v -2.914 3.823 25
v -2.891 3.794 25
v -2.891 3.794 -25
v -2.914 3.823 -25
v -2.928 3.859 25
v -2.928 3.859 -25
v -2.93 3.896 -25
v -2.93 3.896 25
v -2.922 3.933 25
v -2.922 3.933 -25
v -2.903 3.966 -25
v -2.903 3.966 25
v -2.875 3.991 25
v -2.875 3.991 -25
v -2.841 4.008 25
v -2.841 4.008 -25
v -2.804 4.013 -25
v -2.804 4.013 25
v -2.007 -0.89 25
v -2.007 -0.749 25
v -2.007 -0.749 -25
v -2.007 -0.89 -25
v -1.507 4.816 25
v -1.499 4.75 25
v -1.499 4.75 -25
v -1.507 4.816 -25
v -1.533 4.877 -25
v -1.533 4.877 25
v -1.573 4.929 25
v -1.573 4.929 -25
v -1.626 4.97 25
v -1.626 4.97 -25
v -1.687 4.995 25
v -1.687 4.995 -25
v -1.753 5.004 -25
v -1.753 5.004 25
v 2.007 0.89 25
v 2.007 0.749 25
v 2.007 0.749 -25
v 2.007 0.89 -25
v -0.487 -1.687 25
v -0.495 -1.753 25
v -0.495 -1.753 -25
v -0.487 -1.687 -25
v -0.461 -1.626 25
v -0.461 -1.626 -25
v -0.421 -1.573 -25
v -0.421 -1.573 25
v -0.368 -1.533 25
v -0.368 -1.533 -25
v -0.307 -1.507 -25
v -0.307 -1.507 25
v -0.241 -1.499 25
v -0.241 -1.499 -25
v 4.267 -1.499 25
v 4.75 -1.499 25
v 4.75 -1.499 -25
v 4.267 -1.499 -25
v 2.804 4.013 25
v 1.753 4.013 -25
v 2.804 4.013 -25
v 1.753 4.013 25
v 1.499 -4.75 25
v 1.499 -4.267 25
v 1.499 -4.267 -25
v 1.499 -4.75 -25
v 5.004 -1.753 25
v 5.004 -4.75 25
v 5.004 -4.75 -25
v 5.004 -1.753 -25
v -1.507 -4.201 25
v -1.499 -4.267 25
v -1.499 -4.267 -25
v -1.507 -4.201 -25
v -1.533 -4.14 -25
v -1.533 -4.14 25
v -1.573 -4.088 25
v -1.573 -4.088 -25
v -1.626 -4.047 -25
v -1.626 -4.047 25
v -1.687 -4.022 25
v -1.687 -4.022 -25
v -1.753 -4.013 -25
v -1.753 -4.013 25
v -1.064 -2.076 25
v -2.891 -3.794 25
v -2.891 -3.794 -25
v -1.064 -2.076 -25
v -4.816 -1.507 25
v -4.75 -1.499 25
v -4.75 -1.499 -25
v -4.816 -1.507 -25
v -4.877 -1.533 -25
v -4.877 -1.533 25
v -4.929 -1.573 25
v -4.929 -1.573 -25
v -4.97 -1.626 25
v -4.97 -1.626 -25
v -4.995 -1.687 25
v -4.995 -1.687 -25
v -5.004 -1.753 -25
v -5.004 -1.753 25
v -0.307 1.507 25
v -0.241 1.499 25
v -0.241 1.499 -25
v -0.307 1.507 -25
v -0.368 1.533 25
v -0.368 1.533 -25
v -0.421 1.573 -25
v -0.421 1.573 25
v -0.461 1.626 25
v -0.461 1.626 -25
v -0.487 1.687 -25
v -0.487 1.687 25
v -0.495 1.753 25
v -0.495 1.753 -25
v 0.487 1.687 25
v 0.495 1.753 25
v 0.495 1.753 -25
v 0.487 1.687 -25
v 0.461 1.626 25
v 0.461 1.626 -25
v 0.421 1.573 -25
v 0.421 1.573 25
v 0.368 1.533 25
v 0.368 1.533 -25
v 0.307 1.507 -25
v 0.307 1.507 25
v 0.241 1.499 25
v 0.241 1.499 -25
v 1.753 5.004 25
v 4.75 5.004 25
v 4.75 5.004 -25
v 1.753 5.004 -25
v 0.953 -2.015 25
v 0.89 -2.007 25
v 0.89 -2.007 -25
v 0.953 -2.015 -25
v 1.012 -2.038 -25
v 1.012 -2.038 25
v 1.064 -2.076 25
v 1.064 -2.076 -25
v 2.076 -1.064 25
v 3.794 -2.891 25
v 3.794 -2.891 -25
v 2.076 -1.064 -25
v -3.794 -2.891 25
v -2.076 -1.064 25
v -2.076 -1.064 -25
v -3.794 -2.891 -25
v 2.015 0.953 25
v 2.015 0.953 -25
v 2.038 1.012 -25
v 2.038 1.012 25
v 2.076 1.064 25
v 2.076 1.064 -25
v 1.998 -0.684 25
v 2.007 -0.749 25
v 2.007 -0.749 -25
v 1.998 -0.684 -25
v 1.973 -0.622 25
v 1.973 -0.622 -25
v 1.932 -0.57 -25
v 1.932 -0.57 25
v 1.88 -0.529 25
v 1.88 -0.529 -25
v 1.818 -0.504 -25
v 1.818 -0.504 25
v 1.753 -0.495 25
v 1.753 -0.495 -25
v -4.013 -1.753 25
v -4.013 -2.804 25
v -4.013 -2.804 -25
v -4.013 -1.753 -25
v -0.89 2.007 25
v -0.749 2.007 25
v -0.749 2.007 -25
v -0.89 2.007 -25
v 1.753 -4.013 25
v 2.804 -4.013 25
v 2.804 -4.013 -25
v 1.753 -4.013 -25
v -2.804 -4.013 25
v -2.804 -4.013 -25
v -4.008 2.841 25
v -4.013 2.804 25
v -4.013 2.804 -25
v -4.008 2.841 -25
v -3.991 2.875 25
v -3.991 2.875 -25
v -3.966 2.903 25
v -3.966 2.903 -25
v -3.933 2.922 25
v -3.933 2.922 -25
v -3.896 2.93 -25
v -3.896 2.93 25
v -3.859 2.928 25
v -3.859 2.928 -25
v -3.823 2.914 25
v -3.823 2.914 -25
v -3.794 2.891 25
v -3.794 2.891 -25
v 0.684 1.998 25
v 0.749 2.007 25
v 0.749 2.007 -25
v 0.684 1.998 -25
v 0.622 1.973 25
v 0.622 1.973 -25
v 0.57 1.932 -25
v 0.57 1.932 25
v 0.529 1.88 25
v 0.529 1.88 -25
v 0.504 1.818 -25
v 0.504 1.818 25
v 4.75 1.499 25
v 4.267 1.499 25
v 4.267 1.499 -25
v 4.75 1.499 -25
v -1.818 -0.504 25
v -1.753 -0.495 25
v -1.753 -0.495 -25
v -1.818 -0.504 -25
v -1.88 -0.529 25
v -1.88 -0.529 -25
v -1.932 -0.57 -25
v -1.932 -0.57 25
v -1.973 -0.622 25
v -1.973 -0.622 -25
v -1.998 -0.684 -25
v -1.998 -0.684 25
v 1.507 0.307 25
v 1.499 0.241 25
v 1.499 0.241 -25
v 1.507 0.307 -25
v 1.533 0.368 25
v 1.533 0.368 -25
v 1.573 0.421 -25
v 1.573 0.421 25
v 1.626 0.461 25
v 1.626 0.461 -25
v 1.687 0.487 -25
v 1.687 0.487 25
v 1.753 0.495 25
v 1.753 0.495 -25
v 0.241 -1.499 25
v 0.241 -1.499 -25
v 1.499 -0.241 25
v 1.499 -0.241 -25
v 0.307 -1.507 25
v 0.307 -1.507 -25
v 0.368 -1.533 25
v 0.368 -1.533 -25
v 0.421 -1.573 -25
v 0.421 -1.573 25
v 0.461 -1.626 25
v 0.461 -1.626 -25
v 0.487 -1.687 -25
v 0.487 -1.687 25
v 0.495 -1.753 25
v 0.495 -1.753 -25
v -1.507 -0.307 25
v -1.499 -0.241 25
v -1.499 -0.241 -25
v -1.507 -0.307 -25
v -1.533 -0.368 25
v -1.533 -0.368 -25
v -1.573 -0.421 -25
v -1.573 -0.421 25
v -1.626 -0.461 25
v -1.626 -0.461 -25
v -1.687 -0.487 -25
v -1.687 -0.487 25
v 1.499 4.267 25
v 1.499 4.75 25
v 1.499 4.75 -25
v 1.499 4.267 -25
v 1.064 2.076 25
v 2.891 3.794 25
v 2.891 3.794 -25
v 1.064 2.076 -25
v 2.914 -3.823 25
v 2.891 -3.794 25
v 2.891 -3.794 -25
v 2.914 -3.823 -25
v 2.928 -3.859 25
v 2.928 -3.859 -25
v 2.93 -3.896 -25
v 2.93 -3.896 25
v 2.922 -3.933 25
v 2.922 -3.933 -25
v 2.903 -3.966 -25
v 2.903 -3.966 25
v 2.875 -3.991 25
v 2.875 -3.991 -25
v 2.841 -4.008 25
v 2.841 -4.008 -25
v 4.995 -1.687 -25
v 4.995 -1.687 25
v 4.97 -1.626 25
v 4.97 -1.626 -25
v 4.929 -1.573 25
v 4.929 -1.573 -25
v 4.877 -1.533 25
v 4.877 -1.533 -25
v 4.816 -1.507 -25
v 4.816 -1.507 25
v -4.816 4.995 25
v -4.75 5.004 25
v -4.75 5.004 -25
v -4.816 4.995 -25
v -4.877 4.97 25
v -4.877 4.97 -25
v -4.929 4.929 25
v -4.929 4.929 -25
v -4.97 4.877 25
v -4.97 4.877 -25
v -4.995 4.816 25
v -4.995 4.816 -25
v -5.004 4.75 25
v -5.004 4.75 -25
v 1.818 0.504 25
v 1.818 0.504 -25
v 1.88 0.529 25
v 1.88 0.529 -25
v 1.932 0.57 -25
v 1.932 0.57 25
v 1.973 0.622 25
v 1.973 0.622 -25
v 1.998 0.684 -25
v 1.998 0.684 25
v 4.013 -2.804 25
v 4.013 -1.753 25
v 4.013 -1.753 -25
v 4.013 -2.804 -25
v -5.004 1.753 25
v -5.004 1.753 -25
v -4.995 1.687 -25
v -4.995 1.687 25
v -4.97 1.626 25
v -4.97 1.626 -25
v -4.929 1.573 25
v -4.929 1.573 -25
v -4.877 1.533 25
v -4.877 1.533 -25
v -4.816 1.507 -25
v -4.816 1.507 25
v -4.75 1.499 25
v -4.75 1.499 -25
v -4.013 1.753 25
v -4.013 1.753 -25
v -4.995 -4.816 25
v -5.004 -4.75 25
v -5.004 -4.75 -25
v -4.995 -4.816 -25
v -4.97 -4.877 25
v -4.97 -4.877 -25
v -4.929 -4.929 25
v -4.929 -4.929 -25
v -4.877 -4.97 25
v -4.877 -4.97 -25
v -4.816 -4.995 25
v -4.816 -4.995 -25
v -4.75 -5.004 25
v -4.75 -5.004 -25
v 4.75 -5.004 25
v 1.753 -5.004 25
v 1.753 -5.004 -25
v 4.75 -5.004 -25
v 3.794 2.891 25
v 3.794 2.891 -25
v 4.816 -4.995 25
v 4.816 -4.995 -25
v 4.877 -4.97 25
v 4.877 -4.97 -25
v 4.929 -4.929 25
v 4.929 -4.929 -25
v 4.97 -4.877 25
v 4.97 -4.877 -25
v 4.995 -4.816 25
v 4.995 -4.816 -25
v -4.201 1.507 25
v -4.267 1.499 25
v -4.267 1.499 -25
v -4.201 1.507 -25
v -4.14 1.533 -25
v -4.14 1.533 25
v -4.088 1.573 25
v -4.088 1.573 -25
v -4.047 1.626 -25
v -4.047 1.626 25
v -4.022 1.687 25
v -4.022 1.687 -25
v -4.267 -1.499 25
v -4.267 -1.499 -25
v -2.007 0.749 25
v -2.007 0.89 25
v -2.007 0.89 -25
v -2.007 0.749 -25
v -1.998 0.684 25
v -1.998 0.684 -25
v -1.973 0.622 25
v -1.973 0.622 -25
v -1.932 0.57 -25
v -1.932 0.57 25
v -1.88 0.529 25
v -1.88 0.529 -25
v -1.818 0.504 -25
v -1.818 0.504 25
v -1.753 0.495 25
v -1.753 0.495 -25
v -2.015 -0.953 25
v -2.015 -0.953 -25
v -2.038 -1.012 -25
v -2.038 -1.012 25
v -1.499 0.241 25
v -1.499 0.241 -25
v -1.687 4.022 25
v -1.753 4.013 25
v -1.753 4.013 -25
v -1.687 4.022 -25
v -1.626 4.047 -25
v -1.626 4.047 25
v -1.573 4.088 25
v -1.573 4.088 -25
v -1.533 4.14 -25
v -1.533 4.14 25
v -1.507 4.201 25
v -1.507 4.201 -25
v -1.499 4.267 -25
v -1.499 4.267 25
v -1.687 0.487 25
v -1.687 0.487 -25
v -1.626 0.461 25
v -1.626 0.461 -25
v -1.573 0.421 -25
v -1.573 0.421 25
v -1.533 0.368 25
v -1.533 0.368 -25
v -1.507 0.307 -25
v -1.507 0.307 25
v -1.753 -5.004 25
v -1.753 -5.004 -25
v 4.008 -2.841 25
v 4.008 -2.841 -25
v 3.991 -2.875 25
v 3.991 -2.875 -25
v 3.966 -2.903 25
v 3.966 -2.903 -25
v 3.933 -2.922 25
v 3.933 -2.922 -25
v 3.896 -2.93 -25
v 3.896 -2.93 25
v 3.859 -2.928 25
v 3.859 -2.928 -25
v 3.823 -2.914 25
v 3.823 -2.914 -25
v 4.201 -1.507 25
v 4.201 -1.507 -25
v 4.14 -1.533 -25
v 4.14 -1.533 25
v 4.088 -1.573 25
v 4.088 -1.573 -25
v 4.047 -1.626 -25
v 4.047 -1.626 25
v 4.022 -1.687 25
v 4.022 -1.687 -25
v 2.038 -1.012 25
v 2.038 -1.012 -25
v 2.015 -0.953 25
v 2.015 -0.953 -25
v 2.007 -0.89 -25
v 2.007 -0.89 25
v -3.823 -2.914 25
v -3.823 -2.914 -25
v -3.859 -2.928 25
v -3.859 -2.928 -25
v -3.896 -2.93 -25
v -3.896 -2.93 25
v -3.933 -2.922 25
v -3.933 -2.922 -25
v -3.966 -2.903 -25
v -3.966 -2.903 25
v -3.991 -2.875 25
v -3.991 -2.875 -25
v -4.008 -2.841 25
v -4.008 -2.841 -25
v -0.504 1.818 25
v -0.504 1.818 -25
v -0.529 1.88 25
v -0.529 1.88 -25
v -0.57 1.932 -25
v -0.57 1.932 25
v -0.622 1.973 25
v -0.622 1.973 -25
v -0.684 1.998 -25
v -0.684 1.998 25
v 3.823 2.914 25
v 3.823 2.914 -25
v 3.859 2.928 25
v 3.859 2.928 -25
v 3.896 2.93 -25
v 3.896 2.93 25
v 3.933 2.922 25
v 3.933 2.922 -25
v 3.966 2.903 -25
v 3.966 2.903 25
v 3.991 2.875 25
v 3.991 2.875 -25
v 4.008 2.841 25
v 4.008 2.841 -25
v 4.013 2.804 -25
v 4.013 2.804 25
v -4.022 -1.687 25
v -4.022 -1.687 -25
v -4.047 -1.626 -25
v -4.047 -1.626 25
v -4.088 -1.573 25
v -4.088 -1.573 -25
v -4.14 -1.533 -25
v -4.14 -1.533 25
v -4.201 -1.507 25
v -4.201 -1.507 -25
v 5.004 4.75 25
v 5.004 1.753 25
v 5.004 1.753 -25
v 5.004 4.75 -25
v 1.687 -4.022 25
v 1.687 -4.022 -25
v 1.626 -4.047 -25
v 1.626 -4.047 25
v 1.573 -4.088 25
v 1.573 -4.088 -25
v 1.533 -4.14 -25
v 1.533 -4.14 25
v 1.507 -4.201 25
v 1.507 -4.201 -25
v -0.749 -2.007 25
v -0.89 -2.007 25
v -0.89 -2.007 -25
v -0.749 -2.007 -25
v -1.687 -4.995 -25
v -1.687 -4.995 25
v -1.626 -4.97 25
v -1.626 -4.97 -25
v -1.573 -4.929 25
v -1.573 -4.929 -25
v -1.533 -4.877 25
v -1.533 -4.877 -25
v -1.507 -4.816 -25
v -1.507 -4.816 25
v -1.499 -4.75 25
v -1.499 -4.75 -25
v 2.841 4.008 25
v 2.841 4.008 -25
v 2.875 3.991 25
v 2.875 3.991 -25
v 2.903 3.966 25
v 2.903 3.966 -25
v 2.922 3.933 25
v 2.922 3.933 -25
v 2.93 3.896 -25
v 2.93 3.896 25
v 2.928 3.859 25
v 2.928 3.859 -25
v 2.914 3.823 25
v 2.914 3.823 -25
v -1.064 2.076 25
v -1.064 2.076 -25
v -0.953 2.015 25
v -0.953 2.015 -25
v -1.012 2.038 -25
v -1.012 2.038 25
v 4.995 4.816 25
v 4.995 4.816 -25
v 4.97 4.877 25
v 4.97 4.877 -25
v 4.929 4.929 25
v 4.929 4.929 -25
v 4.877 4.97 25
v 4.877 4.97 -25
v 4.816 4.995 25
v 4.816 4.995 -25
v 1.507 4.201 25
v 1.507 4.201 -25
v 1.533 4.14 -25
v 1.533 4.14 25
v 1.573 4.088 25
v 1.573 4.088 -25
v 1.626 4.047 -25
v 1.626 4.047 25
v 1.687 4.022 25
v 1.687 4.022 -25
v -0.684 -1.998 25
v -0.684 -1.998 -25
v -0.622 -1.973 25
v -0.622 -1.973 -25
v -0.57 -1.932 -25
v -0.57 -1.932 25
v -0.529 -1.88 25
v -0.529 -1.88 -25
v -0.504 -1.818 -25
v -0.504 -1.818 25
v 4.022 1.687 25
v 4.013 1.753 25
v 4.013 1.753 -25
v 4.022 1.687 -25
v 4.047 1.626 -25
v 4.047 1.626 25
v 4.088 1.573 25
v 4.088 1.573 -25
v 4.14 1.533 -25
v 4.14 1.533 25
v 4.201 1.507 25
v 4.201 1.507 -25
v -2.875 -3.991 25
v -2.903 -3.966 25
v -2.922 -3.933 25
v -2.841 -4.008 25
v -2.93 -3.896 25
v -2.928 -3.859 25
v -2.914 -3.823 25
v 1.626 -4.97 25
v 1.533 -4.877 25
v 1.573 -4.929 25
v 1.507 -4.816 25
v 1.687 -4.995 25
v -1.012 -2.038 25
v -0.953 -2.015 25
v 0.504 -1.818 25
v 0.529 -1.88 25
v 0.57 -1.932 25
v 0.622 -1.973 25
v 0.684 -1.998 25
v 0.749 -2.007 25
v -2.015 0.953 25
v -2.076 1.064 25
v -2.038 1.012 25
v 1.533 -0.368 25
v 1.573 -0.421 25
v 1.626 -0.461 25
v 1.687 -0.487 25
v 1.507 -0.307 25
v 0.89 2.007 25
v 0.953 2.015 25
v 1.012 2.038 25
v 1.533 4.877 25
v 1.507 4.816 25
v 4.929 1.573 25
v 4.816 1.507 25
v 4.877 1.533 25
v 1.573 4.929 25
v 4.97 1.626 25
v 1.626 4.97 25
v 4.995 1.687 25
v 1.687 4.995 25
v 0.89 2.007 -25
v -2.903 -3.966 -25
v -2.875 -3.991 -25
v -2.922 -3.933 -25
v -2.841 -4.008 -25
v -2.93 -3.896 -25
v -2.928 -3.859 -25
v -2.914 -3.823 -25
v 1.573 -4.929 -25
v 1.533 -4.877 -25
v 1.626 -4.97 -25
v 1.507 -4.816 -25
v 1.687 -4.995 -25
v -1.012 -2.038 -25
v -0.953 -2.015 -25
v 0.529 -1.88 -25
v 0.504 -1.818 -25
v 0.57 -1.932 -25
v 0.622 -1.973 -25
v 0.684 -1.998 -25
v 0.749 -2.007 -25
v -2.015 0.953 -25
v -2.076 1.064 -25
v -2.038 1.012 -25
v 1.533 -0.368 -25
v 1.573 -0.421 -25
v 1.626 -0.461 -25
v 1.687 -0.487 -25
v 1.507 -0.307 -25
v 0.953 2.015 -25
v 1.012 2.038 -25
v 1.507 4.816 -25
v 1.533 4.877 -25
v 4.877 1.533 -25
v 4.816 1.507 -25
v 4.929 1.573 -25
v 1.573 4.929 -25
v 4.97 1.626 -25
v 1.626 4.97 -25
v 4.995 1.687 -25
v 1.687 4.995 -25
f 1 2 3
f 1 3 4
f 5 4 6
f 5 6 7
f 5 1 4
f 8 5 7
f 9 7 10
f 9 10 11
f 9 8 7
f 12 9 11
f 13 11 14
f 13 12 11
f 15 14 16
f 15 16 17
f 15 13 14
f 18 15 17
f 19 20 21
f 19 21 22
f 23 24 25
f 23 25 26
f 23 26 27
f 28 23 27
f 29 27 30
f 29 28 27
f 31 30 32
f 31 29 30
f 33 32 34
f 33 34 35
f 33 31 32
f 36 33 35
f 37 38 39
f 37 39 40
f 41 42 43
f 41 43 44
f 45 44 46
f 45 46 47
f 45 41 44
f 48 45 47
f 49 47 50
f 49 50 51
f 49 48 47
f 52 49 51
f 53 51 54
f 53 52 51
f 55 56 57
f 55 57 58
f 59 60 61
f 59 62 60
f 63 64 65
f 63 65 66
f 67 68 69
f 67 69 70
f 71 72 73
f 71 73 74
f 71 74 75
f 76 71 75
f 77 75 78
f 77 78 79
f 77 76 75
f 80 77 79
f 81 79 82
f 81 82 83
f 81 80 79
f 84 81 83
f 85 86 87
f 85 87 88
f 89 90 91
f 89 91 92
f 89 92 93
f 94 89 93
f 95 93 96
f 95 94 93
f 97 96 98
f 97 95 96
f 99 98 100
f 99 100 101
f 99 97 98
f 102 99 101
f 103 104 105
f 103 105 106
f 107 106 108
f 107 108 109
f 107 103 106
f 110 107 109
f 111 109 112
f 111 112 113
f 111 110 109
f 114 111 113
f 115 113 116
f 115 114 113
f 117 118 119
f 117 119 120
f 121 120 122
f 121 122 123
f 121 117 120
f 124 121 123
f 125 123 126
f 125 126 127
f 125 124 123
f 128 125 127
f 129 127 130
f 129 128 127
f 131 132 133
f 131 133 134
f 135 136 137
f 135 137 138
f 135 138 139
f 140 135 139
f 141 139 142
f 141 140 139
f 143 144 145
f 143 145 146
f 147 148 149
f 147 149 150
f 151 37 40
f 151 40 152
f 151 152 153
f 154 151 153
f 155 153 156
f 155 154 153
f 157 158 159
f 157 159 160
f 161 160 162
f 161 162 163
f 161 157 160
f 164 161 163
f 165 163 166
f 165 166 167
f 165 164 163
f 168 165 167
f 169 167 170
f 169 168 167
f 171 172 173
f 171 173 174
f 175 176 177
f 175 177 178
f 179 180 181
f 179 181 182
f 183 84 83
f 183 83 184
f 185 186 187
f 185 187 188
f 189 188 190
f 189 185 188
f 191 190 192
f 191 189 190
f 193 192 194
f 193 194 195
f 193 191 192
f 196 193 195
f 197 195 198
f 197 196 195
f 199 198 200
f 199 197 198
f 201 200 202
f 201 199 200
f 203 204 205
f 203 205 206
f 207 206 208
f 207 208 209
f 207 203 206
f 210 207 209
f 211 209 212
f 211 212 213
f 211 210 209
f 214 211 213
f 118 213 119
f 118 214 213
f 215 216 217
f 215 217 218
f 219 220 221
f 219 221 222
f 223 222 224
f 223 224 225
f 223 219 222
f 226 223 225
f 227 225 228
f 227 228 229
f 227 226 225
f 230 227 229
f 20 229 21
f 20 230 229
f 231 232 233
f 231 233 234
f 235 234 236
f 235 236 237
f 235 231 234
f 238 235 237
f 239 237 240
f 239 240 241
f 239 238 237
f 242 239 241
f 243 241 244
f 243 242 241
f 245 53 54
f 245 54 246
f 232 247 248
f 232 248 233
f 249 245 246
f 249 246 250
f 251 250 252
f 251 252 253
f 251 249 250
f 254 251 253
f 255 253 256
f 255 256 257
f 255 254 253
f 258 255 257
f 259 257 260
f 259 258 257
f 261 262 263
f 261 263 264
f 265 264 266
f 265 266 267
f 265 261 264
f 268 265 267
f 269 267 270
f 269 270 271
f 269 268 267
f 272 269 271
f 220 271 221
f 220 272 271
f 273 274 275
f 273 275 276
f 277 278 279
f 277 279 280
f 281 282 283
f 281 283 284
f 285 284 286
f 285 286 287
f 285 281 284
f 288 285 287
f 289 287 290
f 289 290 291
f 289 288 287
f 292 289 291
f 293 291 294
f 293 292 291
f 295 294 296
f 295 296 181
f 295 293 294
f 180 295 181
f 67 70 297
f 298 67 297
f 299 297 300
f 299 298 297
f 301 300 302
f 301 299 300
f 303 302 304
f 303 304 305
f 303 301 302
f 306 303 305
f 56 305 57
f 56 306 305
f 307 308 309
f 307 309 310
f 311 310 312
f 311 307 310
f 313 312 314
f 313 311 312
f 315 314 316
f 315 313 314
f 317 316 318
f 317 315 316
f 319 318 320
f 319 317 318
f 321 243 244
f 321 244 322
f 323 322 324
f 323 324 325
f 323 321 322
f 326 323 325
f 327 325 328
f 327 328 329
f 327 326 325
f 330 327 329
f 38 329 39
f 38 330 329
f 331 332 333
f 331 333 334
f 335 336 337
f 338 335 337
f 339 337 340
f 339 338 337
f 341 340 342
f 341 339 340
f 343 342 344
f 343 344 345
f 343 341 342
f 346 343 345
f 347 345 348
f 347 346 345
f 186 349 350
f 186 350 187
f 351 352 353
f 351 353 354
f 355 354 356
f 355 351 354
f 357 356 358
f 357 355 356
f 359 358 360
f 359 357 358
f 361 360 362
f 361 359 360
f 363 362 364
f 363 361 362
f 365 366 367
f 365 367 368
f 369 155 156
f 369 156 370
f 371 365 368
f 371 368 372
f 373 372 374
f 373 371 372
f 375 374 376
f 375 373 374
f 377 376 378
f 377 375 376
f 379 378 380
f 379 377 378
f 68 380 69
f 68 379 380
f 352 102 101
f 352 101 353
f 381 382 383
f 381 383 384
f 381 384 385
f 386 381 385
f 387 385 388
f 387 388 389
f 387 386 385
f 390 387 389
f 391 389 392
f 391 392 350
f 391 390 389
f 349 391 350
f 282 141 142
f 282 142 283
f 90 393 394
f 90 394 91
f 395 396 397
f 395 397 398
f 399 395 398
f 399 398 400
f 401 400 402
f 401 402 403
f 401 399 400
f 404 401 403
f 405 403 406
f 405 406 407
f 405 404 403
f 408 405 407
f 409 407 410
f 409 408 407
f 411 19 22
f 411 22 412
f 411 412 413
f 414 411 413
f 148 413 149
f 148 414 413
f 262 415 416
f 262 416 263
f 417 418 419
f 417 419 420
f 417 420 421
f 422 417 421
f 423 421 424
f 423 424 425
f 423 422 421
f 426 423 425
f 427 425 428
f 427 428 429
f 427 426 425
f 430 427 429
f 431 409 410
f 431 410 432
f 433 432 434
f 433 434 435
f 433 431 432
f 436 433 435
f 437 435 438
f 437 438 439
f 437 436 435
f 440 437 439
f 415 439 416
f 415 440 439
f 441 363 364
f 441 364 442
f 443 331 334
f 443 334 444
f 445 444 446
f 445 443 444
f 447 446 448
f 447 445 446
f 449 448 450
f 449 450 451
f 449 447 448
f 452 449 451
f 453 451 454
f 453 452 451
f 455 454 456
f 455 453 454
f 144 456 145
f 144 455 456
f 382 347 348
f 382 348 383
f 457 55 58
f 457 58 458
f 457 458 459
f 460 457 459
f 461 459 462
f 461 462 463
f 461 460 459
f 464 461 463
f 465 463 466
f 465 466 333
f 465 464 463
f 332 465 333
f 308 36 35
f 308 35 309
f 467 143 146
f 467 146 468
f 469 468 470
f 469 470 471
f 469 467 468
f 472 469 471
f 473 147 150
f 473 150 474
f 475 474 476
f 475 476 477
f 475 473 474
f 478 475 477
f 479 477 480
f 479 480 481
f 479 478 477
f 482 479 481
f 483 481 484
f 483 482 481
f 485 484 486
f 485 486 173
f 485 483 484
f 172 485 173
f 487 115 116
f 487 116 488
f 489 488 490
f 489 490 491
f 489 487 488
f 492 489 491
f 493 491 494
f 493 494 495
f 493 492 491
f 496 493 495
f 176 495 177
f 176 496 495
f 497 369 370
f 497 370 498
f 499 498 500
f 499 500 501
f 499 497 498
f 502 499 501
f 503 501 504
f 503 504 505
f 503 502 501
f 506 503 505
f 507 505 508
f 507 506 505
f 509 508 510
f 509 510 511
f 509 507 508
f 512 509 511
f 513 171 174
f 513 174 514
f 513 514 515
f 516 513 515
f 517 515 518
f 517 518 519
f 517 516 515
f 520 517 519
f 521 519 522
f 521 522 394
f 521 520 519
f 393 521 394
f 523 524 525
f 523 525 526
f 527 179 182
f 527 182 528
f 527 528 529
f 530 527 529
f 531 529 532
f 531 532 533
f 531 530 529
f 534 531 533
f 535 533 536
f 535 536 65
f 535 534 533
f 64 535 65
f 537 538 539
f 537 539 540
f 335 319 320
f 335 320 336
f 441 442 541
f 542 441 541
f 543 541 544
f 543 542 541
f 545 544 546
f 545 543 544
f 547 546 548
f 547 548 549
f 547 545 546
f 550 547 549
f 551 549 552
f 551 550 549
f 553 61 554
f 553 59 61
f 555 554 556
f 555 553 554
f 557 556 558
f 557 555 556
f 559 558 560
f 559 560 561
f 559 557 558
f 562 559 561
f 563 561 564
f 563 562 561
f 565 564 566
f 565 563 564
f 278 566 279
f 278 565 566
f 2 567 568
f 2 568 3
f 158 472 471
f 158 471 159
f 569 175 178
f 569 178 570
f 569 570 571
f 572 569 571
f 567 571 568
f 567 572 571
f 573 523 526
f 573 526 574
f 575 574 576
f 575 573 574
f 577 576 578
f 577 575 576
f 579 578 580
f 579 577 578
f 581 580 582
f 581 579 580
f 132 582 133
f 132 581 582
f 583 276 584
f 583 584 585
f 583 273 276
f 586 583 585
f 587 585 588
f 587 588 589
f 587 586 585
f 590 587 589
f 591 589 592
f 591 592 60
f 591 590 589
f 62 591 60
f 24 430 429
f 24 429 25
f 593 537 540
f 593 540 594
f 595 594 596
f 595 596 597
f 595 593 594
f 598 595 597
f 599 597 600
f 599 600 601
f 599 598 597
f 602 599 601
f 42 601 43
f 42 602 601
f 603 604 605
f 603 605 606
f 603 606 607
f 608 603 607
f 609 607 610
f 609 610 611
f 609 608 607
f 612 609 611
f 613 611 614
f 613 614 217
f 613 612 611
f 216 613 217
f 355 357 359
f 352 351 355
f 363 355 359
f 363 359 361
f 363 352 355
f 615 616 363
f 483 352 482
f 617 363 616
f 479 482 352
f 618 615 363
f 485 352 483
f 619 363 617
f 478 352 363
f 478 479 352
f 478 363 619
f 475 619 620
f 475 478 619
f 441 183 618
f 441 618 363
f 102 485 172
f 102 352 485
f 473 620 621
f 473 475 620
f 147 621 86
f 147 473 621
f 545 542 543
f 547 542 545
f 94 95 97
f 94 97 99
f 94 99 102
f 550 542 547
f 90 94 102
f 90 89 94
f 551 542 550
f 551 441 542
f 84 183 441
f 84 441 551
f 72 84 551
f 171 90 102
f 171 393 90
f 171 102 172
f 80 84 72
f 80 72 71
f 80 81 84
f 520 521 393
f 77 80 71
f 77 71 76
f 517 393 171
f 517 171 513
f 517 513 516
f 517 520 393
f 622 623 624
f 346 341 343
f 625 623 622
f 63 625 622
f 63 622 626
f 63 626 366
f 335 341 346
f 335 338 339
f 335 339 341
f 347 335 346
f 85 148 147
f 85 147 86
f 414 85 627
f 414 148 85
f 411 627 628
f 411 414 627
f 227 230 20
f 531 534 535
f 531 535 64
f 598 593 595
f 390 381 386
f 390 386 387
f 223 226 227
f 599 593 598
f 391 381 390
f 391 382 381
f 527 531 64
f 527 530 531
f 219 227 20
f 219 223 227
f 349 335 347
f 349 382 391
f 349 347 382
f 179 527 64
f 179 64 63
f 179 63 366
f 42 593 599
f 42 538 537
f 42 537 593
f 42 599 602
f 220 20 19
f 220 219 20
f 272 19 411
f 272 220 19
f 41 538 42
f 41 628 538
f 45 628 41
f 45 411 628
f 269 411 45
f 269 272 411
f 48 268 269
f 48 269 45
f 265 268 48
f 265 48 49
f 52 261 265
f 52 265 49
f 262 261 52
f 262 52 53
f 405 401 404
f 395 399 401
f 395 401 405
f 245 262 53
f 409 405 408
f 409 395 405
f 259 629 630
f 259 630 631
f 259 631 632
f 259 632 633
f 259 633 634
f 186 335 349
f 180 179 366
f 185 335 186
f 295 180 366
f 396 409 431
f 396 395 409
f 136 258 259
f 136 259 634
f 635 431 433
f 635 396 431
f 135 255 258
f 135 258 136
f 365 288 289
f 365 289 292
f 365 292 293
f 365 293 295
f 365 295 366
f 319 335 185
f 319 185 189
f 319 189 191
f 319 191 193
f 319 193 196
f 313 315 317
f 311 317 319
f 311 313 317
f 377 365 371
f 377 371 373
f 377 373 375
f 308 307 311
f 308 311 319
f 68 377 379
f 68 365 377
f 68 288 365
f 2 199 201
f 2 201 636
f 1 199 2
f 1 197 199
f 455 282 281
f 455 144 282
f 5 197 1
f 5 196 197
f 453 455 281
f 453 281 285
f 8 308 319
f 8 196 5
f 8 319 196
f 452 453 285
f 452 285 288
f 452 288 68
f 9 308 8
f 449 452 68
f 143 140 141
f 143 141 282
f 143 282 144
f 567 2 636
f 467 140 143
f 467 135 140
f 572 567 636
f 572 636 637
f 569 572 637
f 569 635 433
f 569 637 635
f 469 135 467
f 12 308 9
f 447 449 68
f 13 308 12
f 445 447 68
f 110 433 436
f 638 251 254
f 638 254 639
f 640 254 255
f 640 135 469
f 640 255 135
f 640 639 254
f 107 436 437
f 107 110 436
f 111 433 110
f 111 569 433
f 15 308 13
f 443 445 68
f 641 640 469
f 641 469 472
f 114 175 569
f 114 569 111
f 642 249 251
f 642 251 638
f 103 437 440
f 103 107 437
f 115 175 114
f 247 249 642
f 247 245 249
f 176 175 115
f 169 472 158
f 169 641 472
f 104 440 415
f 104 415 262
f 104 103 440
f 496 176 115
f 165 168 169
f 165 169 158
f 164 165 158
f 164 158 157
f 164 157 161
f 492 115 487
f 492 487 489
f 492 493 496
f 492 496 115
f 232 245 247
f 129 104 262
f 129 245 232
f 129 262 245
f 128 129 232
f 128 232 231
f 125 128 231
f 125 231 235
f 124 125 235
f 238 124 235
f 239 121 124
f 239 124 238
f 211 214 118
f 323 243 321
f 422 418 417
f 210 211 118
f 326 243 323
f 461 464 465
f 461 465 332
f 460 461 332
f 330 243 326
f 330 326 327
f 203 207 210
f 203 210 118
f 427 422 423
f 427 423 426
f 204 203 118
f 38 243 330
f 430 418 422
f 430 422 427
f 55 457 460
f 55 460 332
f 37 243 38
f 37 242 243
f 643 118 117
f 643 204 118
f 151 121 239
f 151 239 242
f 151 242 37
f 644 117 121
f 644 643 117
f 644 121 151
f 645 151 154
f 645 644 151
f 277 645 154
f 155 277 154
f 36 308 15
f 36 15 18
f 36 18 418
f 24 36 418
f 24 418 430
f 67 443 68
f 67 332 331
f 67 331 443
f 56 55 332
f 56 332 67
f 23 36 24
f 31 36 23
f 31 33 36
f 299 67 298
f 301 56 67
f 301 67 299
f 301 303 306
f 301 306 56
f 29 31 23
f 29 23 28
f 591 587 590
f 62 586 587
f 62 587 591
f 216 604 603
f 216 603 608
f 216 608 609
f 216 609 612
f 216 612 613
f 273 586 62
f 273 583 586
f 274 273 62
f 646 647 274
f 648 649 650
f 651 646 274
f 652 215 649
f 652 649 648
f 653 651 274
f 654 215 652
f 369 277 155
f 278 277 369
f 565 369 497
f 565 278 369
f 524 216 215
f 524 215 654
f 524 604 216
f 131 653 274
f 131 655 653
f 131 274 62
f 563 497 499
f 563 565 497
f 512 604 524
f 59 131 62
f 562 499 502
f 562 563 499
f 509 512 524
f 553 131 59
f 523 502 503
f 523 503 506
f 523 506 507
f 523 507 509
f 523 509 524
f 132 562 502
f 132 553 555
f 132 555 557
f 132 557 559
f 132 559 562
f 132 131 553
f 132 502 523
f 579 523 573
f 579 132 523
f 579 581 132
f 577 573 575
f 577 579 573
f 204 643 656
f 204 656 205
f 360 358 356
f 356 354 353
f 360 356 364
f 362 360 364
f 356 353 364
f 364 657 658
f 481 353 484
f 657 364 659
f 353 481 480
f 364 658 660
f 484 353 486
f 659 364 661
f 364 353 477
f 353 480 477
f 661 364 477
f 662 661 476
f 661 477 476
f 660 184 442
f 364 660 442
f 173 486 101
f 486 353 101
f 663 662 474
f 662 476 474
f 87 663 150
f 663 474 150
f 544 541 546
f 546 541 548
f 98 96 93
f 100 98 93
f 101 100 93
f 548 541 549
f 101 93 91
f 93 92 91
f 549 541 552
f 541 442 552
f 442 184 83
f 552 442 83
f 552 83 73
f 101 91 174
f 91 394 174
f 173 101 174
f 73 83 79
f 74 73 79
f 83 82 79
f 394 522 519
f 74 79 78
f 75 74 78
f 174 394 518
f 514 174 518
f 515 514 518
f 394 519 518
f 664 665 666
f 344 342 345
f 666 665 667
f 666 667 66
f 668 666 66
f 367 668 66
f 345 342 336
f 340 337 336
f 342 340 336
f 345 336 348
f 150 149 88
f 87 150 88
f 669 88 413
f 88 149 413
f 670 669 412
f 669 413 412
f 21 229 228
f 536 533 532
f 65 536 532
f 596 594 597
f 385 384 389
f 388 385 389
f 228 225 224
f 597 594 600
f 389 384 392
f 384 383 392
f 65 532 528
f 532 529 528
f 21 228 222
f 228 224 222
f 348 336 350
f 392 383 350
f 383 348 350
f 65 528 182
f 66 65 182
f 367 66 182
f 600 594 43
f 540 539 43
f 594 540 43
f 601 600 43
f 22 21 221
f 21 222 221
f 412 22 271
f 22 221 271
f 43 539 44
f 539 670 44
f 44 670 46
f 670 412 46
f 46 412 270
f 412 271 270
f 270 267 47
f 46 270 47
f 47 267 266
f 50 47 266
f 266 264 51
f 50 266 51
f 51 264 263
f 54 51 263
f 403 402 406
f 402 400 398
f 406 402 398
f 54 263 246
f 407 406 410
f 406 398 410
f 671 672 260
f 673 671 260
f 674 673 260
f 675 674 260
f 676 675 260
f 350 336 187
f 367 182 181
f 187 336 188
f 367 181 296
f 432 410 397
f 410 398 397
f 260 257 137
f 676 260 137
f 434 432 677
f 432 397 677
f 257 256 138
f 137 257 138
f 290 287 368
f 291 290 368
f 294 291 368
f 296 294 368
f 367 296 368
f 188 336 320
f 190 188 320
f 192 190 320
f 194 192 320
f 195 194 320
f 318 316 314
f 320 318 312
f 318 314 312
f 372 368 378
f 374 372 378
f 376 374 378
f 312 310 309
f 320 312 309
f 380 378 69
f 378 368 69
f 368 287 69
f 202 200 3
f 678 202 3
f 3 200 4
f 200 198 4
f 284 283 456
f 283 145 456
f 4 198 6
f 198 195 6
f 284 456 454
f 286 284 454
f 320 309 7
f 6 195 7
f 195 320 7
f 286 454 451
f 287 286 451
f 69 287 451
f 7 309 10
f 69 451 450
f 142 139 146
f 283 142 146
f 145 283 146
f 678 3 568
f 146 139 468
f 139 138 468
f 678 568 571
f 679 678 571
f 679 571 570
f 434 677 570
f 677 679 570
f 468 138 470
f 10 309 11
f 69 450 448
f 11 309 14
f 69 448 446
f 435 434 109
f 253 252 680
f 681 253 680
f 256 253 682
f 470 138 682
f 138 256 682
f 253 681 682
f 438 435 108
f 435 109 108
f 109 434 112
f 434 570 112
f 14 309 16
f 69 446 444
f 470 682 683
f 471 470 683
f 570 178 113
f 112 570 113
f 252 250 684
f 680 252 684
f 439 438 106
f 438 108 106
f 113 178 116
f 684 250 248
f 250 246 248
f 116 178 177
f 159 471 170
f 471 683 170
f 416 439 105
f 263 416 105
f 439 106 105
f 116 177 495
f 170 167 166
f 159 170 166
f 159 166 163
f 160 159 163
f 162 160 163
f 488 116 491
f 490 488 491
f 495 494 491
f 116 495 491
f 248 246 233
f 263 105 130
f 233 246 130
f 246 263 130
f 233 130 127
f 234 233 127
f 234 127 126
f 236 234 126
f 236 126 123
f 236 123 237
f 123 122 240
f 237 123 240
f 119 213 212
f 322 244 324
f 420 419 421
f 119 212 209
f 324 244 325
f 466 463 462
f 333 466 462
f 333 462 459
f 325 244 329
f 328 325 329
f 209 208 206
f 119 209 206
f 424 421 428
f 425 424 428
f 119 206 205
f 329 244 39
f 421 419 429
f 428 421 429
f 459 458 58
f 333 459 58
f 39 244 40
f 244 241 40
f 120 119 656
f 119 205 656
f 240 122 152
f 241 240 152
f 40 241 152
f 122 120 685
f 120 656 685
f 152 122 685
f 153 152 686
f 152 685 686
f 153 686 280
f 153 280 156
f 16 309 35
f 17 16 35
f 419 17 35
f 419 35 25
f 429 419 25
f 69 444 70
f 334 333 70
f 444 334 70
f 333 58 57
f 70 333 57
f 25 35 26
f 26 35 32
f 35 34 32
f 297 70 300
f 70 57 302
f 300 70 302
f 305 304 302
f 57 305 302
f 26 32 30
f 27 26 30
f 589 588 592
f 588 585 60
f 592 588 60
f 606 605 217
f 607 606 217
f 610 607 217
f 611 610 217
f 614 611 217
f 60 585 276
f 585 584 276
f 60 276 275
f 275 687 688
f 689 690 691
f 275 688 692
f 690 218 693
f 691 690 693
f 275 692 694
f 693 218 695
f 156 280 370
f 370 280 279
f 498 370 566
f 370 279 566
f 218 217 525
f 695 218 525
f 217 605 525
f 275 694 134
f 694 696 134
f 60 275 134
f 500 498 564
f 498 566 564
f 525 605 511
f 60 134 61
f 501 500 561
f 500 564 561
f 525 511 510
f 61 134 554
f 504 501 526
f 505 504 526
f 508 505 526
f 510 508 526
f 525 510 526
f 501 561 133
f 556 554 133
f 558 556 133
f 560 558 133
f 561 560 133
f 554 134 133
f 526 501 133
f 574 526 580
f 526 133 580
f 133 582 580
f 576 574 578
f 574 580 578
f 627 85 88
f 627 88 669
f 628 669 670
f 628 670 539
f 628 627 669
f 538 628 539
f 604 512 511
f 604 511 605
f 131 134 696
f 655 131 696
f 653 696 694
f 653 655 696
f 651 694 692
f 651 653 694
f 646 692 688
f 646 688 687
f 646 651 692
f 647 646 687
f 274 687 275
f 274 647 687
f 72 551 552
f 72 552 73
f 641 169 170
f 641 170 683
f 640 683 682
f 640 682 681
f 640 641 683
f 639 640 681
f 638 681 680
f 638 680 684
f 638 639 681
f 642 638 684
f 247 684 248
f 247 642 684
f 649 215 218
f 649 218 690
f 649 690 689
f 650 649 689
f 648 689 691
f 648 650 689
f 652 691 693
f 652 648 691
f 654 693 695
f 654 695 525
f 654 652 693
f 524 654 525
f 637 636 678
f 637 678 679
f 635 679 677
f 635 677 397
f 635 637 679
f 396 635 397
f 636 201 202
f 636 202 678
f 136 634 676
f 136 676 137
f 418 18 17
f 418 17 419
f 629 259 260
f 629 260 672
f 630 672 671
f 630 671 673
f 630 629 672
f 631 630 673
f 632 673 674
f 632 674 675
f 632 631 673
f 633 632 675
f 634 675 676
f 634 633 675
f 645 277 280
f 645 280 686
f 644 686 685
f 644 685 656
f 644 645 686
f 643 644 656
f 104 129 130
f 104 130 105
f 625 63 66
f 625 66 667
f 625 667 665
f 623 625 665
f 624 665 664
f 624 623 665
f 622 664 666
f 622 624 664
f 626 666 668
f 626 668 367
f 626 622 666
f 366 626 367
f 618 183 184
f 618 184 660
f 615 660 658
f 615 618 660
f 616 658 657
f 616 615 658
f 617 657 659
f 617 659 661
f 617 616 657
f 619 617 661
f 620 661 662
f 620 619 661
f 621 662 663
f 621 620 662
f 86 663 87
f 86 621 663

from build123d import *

# Parameters (mm, degrees)
F1_DEPTH = 25


# Not quite as in the source:
# - ends of sketch curves that miss each other by under 0.0002 mm in the source are joined


with BuildPart() as f1:
    # F0 (on Top) → F1 (new body, symmetric)
    with BuildSketch(Plane.XY):
        with BuildLine():
            ThreePointArc((2.803779, 4.0132), (2.9218403787, 3.9330028938), (2.8907965459, 3.7936962341))
            Line((2.8907965459, 3.7936962341), (1.0639298, 2.075561))
            ThreePointArc((1.0639298, 2.075561), (0.9835034993, 2.0244706276), (0.8899144, 2.0066))
            Line((0.8899144, 2.0066), (0.7493, 2.0066))
            ThreePointArc((0.7493, 2.0066), (0.5696948776, 1.9322051224), (0.4953, 1.7526))
            ThreePointArc((0.4953, 1.7526), (0.4209051224, 1.5729948776), (0.2413, 1.4986))
            Line((0.2413, 1.4986), (-0.2413, 1.4986))
            ThreePointArc((-0.2413, 1.4986), (-0.4209051224, 1.5729948776), (-0.4953, 1.7526))
            ThreePointArc((-0.4953, 1.7526), (-0.5696948776, 1.9322051224), (-0.7493, 2.0066))
            Line((-0.7493, 2.0066), (-0.8899144, 2.0066))
            ThreePointArc((-0.8899144, 2.0066), (-0.9835034993, 2.0244706276), (-1.0639233392, 2.0755678701))
            Line((-1.0639233392, 2.0755678701), (-2.8907994, 3.7936932))
            ThreePointArc((-2.8907994, 3.7936932), (-2.9218403787, 3.9330028938), (-2.803779, 4.0132))
            Line((-2.803779, 4.0132), (-1.7526, 4.0132))
            ThreePointArc((-1.7526, 4.0132), (-1.5729948776, 4.0875948776), (-1.4986, 4.2672))
            Line((-1.4986, 4.2672), (-1.4986, 4.7498))
            ThreePointArc((-1.4986, 4.7498), (-1.5729948776, 4.9294051224), (-1.7526, 5.0038))
            Line((-1.7526, 5.0038), (-4.7498, 5.0038))
            ThreePointArc((-4.7498, 5.0038), (-4.9294051224, 4.9294051224), (-5.0038, 4.7498))
            Line((-5.0038, 4.7498), (-5.0038, 1.7526))
            ThreePointArc((-5.0038, 1.7526), (-4.9294051224, 1.5729948776), (-4.7498, 1.4986))
            Line((-4.7498, 1.4986), (-4.2672, 1.4986))
            ThreePointArc((-4.2672, 1.4986), (-4.0875948776, 1.5729948776), (-4.0132, 1.7526))
            Line((-4.0132, 1.7526), (-4.0132, 2.803779))
            ThreePointArc((-4.0132, 2.803779), (-3.9330028938, 2.9218403787), (-3.7936962341, 2.8907965459))
            Line((-3.7936962341, 2.8907965459), (-2.075561, 1.0639298))
            ThreePointArc((-2.075561, 1.0639298), (-2.0244706276, 0.9835034993), (-2.0066, 0.8899144))
            Line((-2.0066, 0.8899144), (-2.0066, 0.7493))
            ThreePointArc((-2.0066, 0.7493), (-1.9322051224, 0.5696948776), (-1.7526, 0.4953))
            ThreePointArc((-1.7526, 0.4953), (-1.5729948776, 0.4209051224), (-1.4986, 0.2413))
            Line((-1.4986, 0.2413), (-1.4986, -0.2413))
            ThreePointArc((-1.4986, -0.2413), (-1.5729948776, -0.4209051224), (-1.7526, -0.4953))
            ThreePointArc((-1.7526, -0.4953), (-1.9322051224, -0.5696948776), (-2.0066, -0.7493))
            Line((-2.0066, -0.7493), (-2.0066, -0.8899144))
            ThreePointArc((-2.0066, -0.8899144), (-2.0244706276, -0.9835034993), (-2.0755678701, -1.0639233392))
            Line((-2.0755678701, -1.0639233392), (-3.7936932, -2.8907994))
            ThreePointArc((-3.7936932, -2.8907994), (-3.9330028938, -2.9218403787), (-4.0132, -2.803779))
            Line((-4.0132, -2.803779), (-4.0132, -1.7526))
            ThreePointArc((-4.0132, -1.7526), (-4.0875948776, -1.5729948776), (-4.2672, -1.4986))
            Line((-4.2672, -1.4986), (-4.7498, -1.4986))
            ThreePointArc((-4.7498, -1.4986), (-4.9294051224, -1.5729948776), (-5.0038, -1.7526))
            Line((-5.0038, -1.7526), (-5.0038, -4.7498))
            ThreePointArc((-5.0038, -4.7498), (-4.9294051224, -4.9294051224), (-4.7498, -5.0038))
            Line((-4.7498, -5.0038), (-1.7526, -5.0038))
            ThreePointArc((-1.7526, -5.0038), (-1.5729948776, -4.9294051224), (-1.4986, -4.7498))
            Line((-1.4986, -4.7498), (-1.4986, -4.2672))
            ThreePointArc((-1.4986, -4.2672), (-1.5729948776, -4.0875948776), (-1.7526, -4.0132))
            Line((-1.7526, -4.0132), (-2.803779, -4.0132))
            ThreePointArc((-2.803779, -4.0132), (-2.9218403787, -3.9330028938), (-2.8907965459, -3.7936962341))
            Line((-2.8907965459, -3.7936962341), (-1.0639298, -2.075561))
            ThreePointArc((-1.0639298, -2.075561), (-0.9835034993, -2.0244706276), (-0.8899144, -2.0066))
            Line((-0.8899144, -2.0066), (-0.7493, -2.0066))
            ThreePointArc((-0.7493, -2.0066), (-0.5696948776, -1.9322051224), (-0.4953, -1.7526))
            ThreePointArc((-0.4953, -1.7526), (-0.4209051224, -1.5729948776), (-0.2413, -1.4986))
            Line((-0.2413, -1.4986), (0.2413, -1.4986))
            ThreePointArc((0.2413, -1.4986), (0.4209051224, -1.5729948776), (0.4953, -1.7526))
            ThreePointArc((0.4953, -1.7526), (0.5696948776, -1.9322051224), (0.7493, -2.0066))
            Line((0.7493, -2.0066), (0.8899144, -2.0066))
            ThreePointArc((0.8899144, -2.0066), (0.9835034993, -2.0244706276), (1.0639233392, -2.0755678701))
            Line((1.0639233392, -2.0755678701), (2.8907994, -3.7936932))
            ThreePointArc((2.8907994, -3.7936932), (2.9218403787, -3.9330028938), (2.803779, -4.0132))
            Line((2.803779, -4.0132), (1.7526, -4.0132))
            ThreePointArc((1.7526, -4.0132), (1.5729948776, -4.0875948776), (1.4986, -4.2672))
            Line((1.4986, -4.2672), (1.4986, -4.7498))
            ThreePointArc((1.4986, -4.7498), (1.5729948776, -4.9294051224), (1.7526, -5.0038))
            Line((1.7526, -5.0038), (4.7498, -5.0038))
            ThreePointArc((4.7498, -5.0038), (4.9294051224, -4.9294051224), (5.0038, -4.7498))
            Line((5.0038, -4.7498), (5.0038, -1.7526))
            ThreePointArc((5.0038, -1.7526), (4.9294051224, -1.5729948776), (4.7498, -1.4986))
            Line((4.7498, -1.4986), (4.2672, -1.4986))
            ThreePointArc((4.2672, -1.4986), (4.0875948776, -1.5729948776), (4.0132, -1.7526))
            Line((4.0132, -1.7526), (4.0132, -2.803779))
            ThreePointArc((4.0132, -2.803779), (3.9330028938, -2.9218403787), (3.7936962341, -2.8907965459))
            Line((3.7936962341, -2.8907965459), (2.075561, -1.0639298))
            ThreePointArc((2.075561, -1.0639298), (2.0244706276, -0.9835034993), (2.0066, -0.8899144))
            Line((2.0066, -0.8899144), (2.0066, -0.7493))
            ThreePointArc((2.0066, -0.7493), (1.9322051224, -0.5696948776), (1.7526, -0.4953))
            ThreePointArc((1.7526, -0.4953), (1.5729948776, -0.4209051224), (1.4986, -0.2413))
            Line((1.4986, -0.2413), (1.4986, 0.2413))
            ThreePointArc((1.4986, 0.2413), (1.5729948776, 0.4209051224), (1.7526, 0.4953))
            ThreePointArc((1.7526, 0.4953), (1.9322051224, 0.5696948776), (2.0066, 0.7493))
            Line((2.0066, 0.7493), (2.0066, 0.8899144))
            ThreePointArc((2.0066, 0.8899144), (2.0244706276, 0.9835034993), (2.0755678701, 1.0639233392))
            Line((2.0755678701, 1.0639233392), (3.7936932, 2.8907994))
            ThreePointArc((3.7936932, 2.8907994), (3.9330028938, 2.9218403787), (4.0132, 2.803779))
            Line((4.0132, 2.803779), (4.0132, 1.7526))
            ThreePointArc((4.0132, 1.7526), (4.0875948776, 1.5729948776), (4.2672, 1.4986))
            Line((4.2672, 1.4986), (4.7498, 1.4986))
            ThreePointArc((4.7498, 1.4986), (4.9294051224, 1.5729948776), (5.0038, 1.7526))
            Line((5.0038, 1.7526), (5.0038, 4.7498))
            ThreePointArc((5.0038, 4.7498), (4.9294051224, 4.9294051224), (4.7498, 5.0038))
            Line((4.7498, 5.0038), (1.7526, 5.0038))
            ThreePointArc((1.7526, 5.0038), (1.5729948776, 4.9294051224), (1.4986, 4.7498))
            Line((1.4986, 4.7498), (1.4986, 4.2672))
            ThreePointArc((1.4986, 4.2672), (1.5729948776, 4.0875948776), (1.7526, 4.0132))
            Line((1.7526, 4.0132), (2.803779, 4.0132))
        make_face()
    extrude(amount=F1_DEPTH, both=True)


solid = f1.part
